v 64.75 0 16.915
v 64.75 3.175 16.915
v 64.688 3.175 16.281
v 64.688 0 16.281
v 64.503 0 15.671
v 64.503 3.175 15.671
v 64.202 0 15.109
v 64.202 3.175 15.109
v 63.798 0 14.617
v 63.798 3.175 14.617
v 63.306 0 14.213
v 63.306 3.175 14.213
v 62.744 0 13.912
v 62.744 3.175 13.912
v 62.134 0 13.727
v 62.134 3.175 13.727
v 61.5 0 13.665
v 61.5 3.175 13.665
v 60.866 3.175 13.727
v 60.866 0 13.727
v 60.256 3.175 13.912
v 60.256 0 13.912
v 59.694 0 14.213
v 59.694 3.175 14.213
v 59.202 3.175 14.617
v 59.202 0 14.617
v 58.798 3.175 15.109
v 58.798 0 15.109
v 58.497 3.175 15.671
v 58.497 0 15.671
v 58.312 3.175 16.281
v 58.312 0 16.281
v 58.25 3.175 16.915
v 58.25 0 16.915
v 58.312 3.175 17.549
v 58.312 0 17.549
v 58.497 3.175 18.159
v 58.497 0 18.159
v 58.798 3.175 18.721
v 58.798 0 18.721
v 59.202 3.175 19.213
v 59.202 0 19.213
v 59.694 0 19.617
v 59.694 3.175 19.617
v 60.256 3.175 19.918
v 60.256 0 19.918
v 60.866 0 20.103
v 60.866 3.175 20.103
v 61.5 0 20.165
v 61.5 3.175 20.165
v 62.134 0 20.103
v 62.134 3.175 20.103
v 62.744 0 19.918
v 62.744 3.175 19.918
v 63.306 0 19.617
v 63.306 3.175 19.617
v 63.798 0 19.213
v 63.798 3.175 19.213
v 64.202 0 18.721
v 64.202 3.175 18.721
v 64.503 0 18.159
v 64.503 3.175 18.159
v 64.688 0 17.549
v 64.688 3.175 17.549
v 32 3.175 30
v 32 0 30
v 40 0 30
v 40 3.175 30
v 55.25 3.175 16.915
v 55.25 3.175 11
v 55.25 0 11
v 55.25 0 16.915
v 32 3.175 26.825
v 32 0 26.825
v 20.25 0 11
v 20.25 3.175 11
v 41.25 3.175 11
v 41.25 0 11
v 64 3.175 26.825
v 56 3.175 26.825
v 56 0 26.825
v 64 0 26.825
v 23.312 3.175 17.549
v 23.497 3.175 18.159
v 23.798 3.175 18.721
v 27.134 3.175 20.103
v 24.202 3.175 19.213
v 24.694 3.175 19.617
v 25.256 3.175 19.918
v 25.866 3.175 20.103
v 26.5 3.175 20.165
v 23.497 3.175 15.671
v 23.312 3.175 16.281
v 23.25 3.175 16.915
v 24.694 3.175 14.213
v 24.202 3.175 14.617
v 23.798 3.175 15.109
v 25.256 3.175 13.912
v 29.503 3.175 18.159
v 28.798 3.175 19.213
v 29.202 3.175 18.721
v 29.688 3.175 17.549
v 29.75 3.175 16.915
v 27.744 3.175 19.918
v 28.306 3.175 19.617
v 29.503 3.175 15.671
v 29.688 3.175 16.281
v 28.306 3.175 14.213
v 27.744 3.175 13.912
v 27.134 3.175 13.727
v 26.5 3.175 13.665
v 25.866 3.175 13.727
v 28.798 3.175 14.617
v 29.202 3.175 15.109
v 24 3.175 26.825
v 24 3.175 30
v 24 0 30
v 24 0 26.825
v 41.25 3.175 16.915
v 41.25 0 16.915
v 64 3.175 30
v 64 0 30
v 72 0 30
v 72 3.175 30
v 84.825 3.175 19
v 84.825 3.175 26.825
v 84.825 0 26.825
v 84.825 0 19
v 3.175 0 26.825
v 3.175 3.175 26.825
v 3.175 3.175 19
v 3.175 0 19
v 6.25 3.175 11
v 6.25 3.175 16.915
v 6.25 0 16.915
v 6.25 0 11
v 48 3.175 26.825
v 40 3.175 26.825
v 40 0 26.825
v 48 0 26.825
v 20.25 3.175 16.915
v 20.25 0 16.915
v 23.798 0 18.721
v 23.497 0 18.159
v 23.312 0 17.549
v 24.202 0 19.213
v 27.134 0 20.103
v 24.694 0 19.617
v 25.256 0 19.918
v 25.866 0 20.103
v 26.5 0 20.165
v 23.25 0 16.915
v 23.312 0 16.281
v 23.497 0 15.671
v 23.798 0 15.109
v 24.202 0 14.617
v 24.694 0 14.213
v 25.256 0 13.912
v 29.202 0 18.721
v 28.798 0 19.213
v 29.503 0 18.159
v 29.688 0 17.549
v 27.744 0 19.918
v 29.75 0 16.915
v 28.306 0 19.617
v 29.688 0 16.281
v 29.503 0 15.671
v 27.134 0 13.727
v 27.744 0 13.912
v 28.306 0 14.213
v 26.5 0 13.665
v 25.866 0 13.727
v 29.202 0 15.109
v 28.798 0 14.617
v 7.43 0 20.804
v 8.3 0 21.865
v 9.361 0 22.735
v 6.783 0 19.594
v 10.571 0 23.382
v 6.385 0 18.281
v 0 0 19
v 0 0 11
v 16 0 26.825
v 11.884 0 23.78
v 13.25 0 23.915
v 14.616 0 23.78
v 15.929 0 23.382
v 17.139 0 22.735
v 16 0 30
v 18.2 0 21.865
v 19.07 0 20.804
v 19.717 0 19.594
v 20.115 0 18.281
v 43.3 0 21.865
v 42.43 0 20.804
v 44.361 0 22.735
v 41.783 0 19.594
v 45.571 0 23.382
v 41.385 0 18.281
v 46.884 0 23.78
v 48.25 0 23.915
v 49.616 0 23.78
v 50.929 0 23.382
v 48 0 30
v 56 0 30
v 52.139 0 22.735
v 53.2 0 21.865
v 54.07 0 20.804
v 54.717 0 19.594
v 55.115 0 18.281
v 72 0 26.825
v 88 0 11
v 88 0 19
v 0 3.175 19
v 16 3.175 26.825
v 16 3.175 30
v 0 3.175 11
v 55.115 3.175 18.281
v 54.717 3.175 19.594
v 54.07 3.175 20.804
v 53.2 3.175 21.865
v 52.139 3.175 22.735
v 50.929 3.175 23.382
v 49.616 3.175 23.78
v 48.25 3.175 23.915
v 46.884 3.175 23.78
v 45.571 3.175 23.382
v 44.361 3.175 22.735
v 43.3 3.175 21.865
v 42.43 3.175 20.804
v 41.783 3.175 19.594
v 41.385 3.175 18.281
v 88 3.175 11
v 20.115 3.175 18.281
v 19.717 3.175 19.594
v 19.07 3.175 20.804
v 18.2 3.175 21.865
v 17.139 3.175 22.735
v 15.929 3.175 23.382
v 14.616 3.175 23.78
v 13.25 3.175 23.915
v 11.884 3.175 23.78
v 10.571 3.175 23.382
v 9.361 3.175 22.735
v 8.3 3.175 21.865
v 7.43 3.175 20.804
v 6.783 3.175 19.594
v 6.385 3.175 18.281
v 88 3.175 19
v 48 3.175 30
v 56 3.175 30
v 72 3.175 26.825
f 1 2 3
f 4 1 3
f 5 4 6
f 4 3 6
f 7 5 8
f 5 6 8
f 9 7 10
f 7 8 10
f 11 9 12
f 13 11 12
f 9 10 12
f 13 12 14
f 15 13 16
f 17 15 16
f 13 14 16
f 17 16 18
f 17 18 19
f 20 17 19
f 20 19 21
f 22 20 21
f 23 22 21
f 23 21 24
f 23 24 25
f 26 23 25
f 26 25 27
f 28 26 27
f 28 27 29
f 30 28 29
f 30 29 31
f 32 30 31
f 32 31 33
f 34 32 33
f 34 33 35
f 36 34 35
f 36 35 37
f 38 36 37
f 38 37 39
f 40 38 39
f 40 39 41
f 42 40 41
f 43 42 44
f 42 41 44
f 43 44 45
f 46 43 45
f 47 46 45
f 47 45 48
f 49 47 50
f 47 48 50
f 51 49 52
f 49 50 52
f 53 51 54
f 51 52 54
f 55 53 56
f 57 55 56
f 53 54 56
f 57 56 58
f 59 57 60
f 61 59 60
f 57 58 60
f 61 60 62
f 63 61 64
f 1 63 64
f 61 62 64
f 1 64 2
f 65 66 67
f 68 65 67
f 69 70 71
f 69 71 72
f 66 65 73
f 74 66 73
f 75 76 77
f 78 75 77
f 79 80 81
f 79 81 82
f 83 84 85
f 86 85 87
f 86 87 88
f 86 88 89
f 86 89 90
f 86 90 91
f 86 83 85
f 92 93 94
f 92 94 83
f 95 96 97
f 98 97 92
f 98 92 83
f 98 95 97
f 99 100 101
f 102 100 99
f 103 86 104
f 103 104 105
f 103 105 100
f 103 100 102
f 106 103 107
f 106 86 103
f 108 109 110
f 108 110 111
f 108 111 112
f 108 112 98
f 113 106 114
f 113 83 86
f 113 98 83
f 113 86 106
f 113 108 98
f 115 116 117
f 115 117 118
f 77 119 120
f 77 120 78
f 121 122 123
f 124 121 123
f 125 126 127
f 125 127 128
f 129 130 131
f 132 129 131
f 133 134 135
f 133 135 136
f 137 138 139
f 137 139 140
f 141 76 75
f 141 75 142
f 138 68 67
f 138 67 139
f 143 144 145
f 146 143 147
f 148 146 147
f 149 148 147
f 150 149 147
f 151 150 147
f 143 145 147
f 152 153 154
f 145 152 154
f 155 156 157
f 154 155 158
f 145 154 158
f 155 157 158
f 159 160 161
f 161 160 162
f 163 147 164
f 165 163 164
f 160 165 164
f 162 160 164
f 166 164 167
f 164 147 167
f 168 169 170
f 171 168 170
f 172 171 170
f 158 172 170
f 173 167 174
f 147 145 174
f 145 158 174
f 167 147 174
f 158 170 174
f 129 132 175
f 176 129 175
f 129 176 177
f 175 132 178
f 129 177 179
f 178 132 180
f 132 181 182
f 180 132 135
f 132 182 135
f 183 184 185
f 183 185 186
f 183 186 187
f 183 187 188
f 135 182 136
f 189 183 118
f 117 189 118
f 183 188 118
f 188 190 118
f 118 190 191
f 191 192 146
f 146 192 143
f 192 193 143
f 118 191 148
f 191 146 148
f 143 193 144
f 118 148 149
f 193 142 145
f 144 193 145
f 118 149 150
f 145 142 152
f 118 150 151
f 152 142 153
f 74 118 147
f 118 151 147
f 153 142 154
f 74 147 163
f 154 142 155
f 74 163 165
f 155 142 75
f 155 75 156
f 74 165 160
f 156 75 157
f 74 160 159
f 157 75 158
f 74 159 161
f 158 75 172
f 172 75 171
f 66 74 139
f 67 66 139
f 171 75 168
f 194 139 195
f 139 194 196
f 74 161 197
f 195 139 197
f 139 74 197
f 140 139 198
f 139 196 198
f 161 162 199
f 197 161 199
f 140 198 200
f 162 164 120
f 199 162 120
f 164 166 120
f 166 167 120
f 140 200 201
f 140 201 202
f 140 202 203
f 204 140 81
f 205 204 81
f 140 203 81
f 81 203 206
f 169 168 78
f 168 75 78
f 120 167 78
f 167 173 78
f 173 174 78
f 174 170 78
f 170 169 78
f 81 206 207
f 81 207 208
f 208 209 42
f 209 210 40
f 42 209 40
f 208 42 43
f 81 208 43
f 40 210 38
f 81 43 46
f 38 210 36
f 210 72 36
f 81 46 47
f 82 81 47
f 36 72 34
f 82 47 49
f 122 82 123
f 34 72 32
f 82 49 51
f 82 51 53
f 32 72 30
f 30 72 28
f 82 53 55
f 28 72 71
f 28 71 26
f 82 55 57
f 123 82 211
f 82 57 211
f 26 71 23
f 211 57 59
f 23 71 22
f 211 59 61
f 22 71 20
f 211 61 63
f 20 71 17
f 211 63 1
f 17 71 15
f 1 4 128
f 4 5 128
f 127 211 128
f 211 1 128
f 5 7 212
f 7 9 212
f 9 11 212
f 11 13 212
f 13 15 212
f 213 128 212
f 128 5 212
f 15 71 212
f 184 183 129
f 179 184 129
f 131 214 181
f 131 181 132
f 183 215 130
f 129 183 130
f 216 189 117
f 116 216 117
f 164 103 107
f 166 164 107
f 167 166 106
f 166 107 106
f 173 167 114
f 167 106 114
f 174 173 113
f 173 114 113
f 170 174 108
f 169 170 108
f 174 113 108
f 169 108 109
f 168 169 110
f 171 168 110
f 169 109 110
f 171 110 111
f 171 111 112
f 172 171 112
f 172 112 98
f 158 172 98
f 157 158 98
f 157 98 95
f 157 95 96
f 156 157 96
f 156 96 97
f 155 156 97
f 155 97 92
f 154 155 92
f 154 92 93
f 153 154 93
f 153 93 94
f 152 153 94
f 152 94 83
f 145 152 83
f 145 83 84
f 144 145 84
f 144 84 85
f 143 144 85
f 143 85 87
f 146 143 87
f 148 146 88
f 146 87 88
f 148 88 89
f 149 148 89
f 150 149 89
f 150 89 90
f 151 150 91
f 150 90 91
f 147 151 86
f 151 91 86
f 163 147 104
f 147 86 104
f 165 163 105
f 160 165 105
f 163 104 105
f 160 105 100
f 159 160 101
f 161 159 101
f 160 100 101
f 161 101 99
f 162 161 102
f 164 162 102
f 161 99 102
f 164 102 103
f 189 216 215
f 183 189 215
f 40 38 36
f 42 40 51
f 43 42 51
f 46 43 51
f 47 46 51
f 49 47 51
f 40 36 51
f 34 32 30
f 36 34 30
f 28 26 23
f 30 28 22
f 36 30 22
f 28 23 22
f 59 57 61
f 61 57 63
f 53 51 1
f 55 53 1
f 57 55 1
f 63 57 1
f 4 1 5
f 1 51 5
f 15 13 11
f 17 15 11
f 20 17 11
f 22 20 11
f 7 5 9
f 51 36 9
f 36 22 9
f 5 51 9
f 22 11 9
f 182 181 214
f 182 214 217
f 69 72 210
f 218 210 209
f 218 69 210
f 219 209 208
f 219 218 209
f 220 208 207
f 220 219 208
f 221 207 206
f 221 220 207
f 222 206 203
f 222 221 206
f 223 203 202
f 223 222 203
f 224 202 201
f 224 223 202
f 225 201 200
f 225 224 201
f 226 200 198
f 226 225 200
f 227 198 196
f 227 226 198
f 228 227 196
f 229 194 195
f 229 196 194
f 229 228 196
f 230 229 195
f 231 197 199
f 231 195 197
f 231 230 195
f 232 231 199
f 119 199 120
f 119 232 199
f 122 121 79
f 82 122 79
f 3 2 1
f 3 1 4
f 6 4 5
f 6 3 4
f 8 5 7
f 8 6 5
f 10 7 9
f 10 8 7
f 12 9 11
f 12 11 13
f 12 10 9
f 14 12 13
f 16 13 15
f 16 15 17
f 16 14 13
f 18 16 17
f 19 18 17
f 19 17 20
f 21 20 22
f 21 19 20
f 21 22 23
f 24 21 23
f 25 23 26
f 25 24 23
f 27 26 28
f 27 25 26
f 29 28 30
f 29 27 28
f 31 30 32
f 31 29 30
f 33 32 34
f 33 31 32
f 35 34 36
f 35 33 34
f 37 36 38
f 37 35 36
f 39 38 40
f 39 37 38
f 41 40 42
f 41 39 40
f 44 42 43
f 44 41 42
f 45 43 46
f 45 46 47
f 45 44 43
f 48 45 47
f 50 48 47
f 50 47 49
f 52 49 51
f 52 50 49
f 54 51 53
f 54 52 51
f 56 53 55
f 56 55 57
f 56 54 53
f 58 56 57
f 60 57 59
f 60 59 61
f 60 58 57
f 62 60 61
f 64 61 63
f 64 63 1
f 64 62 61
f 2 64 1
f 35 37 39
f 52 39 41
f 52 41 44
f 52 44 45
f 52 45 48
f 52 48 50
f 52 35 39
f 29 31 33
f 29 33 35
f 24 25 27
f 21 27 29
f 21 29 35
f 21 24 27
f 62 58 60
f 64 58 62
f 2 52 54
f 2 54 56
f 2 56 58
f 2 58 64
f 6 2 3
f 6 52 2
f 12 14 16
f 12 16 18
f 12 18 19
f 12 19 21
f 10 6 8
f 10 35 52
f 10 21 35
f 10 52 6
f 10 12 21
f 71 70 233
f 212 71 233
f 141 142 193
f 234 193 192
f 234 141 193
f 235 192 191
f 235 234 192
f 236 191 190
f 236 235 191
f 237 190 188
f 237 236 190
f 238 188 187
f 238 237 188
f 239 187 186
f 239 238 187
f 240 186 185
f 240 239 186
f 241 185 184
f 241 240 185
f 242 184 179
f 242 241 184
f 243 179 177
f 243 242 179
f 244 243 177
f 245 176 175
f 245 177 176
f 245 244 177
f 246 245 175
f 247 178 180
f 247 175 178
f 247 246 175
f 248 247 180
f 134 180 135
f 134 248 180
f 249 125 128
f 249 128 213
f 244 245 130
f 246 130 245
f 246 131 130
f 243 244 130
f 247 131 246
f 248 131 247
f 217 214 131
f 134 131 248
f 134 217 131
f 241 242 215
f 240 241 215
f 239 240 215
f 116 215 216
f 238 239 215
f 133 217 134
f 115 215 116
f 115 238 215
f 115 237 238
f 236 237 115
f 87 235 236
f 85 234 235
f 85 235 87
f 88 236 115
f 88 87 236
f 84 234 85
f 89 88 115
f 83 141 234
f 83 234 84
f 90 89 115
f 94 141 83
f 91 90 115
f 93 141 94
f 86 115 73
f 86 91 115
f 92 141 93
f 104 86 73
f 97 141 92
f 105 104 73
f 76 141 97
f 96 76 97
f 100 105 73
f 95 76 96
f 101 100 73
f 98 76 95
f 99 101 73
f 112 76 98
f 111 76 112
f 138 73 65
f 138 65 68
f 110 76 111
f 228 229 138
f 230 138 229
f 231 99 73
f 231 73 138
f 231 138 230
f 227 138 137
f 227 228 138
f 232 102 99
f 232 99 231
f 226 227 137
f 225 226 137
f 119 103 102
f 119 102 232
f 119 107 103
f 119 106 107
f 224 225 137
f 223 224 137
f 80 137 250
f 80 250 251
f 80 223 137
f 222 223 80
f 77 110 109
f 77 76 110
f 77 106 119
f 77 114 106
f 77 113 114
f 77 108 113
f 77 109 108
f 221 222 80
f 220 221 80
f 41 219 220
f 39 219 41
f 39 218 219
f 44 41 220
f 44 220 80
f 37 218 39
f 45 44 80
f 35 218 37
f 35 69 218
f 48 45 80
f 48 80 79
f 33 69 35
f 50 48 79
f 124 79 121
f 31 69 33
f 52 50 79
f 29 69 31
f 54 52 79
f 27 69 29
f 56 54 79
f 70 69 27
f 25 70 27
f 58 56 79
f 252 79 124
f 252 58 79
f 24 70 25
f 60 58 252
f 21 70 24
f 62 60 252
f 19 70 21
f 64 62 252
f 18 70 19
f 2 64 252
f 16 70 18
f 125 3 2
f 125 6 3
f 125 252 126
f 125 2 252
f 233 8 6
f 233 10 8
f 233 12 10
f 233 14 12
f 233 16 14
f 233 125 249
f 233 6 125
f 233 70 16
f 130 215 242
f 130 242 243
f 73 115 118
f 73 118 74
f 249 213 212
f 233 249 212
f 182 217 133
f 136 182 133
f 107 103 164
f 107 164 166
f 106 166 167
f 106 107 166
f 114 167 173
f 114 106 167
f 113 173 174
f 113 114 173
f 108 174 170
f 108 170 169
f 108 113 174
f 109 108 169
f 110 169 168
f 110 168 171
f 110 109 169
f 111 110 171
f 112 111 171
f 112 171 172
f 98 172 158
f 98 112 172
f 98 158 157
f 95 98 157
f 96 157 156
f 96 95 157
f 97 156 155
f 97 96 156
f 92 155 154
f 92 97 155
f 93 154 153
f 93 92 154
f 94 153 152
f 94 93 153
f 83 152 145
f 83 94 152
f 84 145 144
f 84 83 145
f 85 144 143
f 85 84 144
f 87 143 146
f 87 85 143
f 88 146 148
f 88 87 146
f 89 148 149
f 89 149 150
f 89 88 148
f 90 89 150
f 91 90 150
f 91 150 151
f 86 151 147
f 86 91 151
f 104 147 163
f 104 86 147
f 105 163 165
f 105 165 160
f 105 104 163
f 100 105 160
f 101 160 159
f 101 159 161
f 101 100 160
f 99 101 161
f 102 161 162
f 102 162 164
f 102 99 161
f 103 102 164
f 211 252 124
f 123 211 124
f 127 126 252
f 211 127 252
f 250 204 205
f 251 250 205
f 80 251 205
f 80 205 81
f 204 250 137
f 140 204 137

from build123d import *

# Parameters (mm, degrees)
SKETCH3_W             = 88
SKETCH3_H             = 30
BOSS_EXTRUDE1_DEPTH   = 3.175
CUT_EXTRUDE1_REACH    = 5.175
SKETCH4_W             = 3.175
SKETCH4_H             = 7.825
SKETCH4_W_2           = 8
SKETCH4_H_2           = 3.175
SKETCH4_H_3           = 11
CUT_EXTRUDE2_REACH    = 5.175
SKETCH5_R             = 3.25
CUT_EXTRUDE3_REACH    = 5.175
SKETCH6_W             = 81.65
SKETCH6_H             = 11
CUT_EXTRUDE4_REACH    = 5.175
SKETCH8_R             = 3.25
BOSS_EXTRUDE2_DEPTH   = 3.175
BOSS_EXTRUDE2_2_DEPTH = 3.175


with BuildPart() as part:
    # Sketch3 → Boss-Extrude1 (new body)
    with BuildSketch(Plane(origin=(0, 0, 0), x_dir=(1, 0, 0), z_dir=(0, 1, 0))):
        with Locations((44, -15)):
            Rectangle(SKETCH3_W, SKETCH3_H)
    extrude(amount=BOSS_EXTRUDE1_DEPTH)

    # Sketch4 → Cut-Extrude1 (cut, up to next)
    with BuildSketch(Plane(origin=(0, 3.175, 0), x_dir=(1, 0, 0), z_dir=(0, 1, 0)), mode=Mode.PRIVATE) as cut_extrude1_sk1:
        with Locations((1.5875, -22.9125)):
            Rectangle(SKETCH4_W, SKETCH4_H)
    cut_extrude1_tool1 = extrude(cut_extrude1_sk1.sketch, amount=-CUT_EXTRUDE1_REACH, mode=Mode.PRIVATE) & part.part
    add(cut_extrude1_tool1.solids().sort_by_distance((1.5875, 3.175, 22.9125))[0], mode=Mode.SUBTRACT)
    # Sketch4 → Cut-Extrude1 (cut, up to next)
    with BuildSketch(Plane(origin=(0, 3.175, 0), x_dir=(1, 0, 0), z_dir=(0, 1, 0)), mode=Mode.PRIVATE) as cut_extrude1_sk2:
        Polygon((0, -30), (16, -30), (16, -26.825), (3.175, -26.825), (0, -26.825), align=None)
    cut_extrude1_tool2 = extrude(cut_extrude1_sk2.sketch, amount=-CUT_EXTRUDE1_REACH, mode=Mode.PRIVATE) & part.part
    add(cut_extrude1_tool2.solids().sort_by_distance((8, 3.175, 28.4125))[0], mode=Mode.SUBTRACT)
    # Sketch4 → Cut-Extrude1 (cut, up to next)
    with BuildSketch(Plane(origin=(0, 3.175, 0), x_dir=(1, 0, 0), z_dir=(0, 1, 0)), mode=Mode.PRIVATE) as cut_extrude1_sk3:
        with Locations((28, -28.4125)):
            Rectangle(SKETCH4_W_2, SKETCH4_H_2)
    cut_extrude1_tool3 = extrude(cut_extrude1_sk3.sketch, amount=-CUT_EXTRUDE1_REACH, mode=Mode.PRIVATE) & part.part
    add(cut_extrude1_tool3.solids().sort_by_distance((28, 3.175, 28.4125))[0], mode=Mode.SUBTRACT)
    # Sketch4 → Cut-Extrude1 (cut, up to next)
    with BuildSketch(Plane(origin=(0, 3.175, 0), x_dir=(1, 0, 0), z_dir=(0, 1, 0)), mode=Mode.PRIVATE) as cut_extrude1_sk4:
        with Locations((44, -28.4125)):
            Rectangle(SKETCH4_W_2, SKETCH4_H_2)
    cut_extrude1_tool4 = extrude(cut_extrude1_sk4.sketch, amount=-CUT_EXTRUDE1_REACH, mode=Mode.PRIVATE) & part.part
    add(cut_extrude1_tool4.solids().sort_by_distance((44, 3.175, 28.4125))[0], mode=Mode.SUBTRACT)
    # Sketch4 → Cut-Extrude1 (cut, up to next)
    with BuildSketch(Plane(origin=(0, 3.175, 0), x_dir=(1, 0, 0), z_dir=(0, 1, 0)), mode=Mode.PRIVATE) as cut_extrude1_sk5:
        with Locations((60, -28.4125)):
            Rectangle(SKETCH4_W_2, SKETCH4_H_2)
    cut_extrude1_tool5 = extrude(cut_extrude1_sk5.sketch, amount=-CUT_EXTRUDE1_REACH, mode=Mode.PRIVATE) & part.part
    add(cut_extrude1_tool5.solids().sort_by_distance((60, 3.175, 28.4125))[0], mode=Mode.SUBTRACT)
    # Sketch4 → Cut-Extrude1 (cut, up to next)
    with BuildSketch(Plane(origin=(0, 3.175, 0), x_dir=(1, 0, 0), z_dir=(0, 1, 0)), mode=Mode.PRIVATE) as cut_extrude1_sk6:
        with Locations((86.4125, -22.9125)):
            Rectangle(SKETCH4_W, SKETCH4_H)
    cut_extrude1_tool6 = extrude(cut_extrude1_sk6.sketch, amount=-CUT_EXTRUDE1_REACH, mode=Mode.PRIVATE) & part.part
    add(cut_extrude1_tool6.solids().sort_by_distance((86.4125, 3.175, 22.9125))[0], mode=Mode.SUBTRACT)
    # Sketch4 → Cut-Extrude1 (cut, up to next)
    with BuildSketch(Plane(origin=(0, 3.175, 0), x_dir=(1, 0, 0), z_dir=(0, 1, 0)), mode=Mode.PRIVATE) as cut_extrude1_sk7:
        with Locations((86.4125, -5.5)):
            Rectangle(SKETCH4_W, SKETCH4_H_3)
    cut_extrude1_tool7 = extrude(cut_extrude1_sk7.sketch, amount=-CUT_EXTRUDE1_REACH, mode=Mode.PRIVATE) & part.part
    add(cut_extrude1_tool7.solids().sort_by_distance((86.4125, 3.175, 5.5))[0], mode=Mode.SUBTRACT)
    # Sketch4 → Cut-Extrude1 (cut, up to next)
    with BuildSketch(Plane(origin=(0, 3.175, 0), x_dir=(1, 0, 0), z_dir=(0, 1, 0)), mode=Mode.PRIVATE) as cut_extrude1_sk8:
        Polygon((72, -26.825), (72, -30), (88, -30), (88, -26.825), (84.825, -26.825), align=None)
    cut_extrude1_tool8 = extrude(cut_extrude1_sk8.sketch, amount=-CUT_EXTRUDE1_REACH, mode=Mode.PRIVATE) & part.part
    add(cut_extrude1_tool8.solids().sort_by_distance((80, 3.175, 28.4125))[0], mode=Mode.SUBTRACT)
    # Sketch4 → Cut-Extrude1 (cut, up to next)
    with BuildSketch(Plane(origin=(0, 3.175, 0), x_dir=(1, 0, 0), z_dir=(0, 1, 0)), mode=Mode.PRIVATE) as cut_extrude1_sk9:
        with Locations((1.5875, -5.5)):
            Rectangle(SKETCH4_W, SKETCH4_H_3)
    cut_extrude1_tool9 = extrude(cut_extrude1_sk9.sketch, amount=-CUT_EXTRUDE1_REACH, mode=Mode.PRIVATE) & part.part
    add(cut_extrude1_tool9.solids().sort_by_distance((1.5875, 3.175, 5.5))[0], mode=Mode.SUBTRACT)

    # Sketch5 → Cut-Extrude2 (cut, up to next)
    with BuildSketch(Plane(origin=(0, 3.175, 0), x_dir=(1, 0, 0), z_dir=(0, 1, 0)), mode=Mode.PRIVATE) as cut_extrude2_sk1:
        with Locations((61.5, -16.915)):
            Circle(SKETCH5_R)
    cut_extrude2_tool1 = extrude(cut_extrude2_sk1.sketch, amount=-CUT_EXTRUDE2_REACH, mode=Mode.PRIVATE) & part.part
    add(cut_extrude2_tool1.solids().sort_by_distance((61.5, 3.175, 16.915))[0], mode=Mode.SUBTRACT)
    # Sketch5 → Cut-Extrude2 (cut, up to next)
    with BuildSketch(Plane(origin=(0, 3.175, 0), x_dir=(1, 0, 0), z_dir=(0, 1, 0)), mode=Mode.PRIVATE) as cut_extrude2_sk2:
        with Locations((26.5, -16.915)):
            Circle(SKETCH5_R)
    cut_extrude2_tool2 = extrude(cut_extrude2_sk2.sketch, amount=-CUT_EXTRUDE2_REACH, mode=Mode.PRIVATE) & part.part
    add(cut_extrude2_tool2.solids().sort_by_distance((26.5, 3.175, 16.915))[0], mode=Mode.SUBTRACT)

    # Sketch6 → Cut-Extrude3 (cut, up to next)
    with BuildSketch(Plane(origin=(0, 3.175, 0), x_dir=(1, 0, 0), z_dir=(0, 1, 0)), mode=Mode.PRIVATE) as cut_extrude3_sk1:
        with Locations((44, -5.5)):
            Rectangle(SKETCH6_W, SKETCH6_H)
    cut_extrude3_tool1 = extrude(cut_extrude3_sk1.sketch, amount=-CUT_EXTRUDE3_REACH, mode=Mode.PRIVATE) & part.part
    add(cut_extrude3_tool1.solids().sort_by_distance((44, 3.175, 5.5))[0], mode=Mode.SUBTRACT)

    # Sketch7 → Cut-Extrude4 (cut, up to next)
    with BuildSketch(Plane(origin=(0, 3.175, 0), x_dir=(1, 0, 0), z_dir=(0, 1, 0)), mode=Mode.PRIVATE) as cut_extrude4_sk1:
        with BuildLine():
            Line((6.25, -16.915), (6.25, -11))
            Line((6.25, -11), (20.25, -11))
            Line((20.25, -11), (20.25, -16.915))
            ThreePointArc((20.25, -16.915), (13.25, -23.915), (6.25, -16.915))
        make_face()
    cut_extrude4_tool1 = extrude(cut_extrude4_sk1.sketch, amount=-CUT_EXTRUDE4_REACH, mode=Mode.PRIVATE) & part.part
    add(cut_extrude4_tool1.solids().sort_by_distance((13.25, 3.175, 16.813335))[0], mode=Mode.SUBTRACT)
    # Sketch7 → Cut-Extrude4 (cut, up to next)
    with BuildSketch(Plane(origin=(0, 3.175, 0), x_dir=(1, 0, 0), z_dir=(0, 1, 0)), mode=Mode.PRIVATE) as cut_extrude4_sk2:
        with BuildLine():
            Line((41.25, -16.915), (41.25, -11))
            Line((41.25, -11), (55.25, -11))
            Line((55.25, -11), (55.25, -16.915))
            ThreePointArc((55.25, -16.915), (48.25, -23.915), (41.25, -16.915))
        make_face()
    cut_extrude4_tool2 = extrude(cut_extrude4_sk2.sketch, amount=-CUT_EXTRUDE4_REACH, mode=Mode.PRIVATE) & part.part
    add(cut_extrude4_tool2.solids().sort_by_distance((48.25, 3.175, 16.813335))[0], mode=Mode.SUBTRACT)


with BuildPart() as body_2:
    # Sketch8 → Boss-Extrude2 (new body)
    with BuildSketch(Plane(origin=(0, 3.175, 0), x_dir=(1, 0, 0), z_dir=(0, 1, 0))):
        with Locations((26.5, -16.915)):
            Circle(SKETCH8_R)
    extrude(amount=-BOSS_EXTRUDE2_DEPTH)


with BuildPart() as body_3:
    # Sketch8 → Boss-Extrude2 2 (new body)
    with BuildSketch(Plane(origin=(0, 3.175, 0), x_dir=(1, 0, 0), z_dir=(0, 1, 0))):
        with Locations((61.5, -16.915)):
            Circle(SKETCH8_R)
    extrude(amount=-BOSS_EXTRUDE2_2_DEPTH)


solid = Compound([part.part, body_2.part, body_3.part])
